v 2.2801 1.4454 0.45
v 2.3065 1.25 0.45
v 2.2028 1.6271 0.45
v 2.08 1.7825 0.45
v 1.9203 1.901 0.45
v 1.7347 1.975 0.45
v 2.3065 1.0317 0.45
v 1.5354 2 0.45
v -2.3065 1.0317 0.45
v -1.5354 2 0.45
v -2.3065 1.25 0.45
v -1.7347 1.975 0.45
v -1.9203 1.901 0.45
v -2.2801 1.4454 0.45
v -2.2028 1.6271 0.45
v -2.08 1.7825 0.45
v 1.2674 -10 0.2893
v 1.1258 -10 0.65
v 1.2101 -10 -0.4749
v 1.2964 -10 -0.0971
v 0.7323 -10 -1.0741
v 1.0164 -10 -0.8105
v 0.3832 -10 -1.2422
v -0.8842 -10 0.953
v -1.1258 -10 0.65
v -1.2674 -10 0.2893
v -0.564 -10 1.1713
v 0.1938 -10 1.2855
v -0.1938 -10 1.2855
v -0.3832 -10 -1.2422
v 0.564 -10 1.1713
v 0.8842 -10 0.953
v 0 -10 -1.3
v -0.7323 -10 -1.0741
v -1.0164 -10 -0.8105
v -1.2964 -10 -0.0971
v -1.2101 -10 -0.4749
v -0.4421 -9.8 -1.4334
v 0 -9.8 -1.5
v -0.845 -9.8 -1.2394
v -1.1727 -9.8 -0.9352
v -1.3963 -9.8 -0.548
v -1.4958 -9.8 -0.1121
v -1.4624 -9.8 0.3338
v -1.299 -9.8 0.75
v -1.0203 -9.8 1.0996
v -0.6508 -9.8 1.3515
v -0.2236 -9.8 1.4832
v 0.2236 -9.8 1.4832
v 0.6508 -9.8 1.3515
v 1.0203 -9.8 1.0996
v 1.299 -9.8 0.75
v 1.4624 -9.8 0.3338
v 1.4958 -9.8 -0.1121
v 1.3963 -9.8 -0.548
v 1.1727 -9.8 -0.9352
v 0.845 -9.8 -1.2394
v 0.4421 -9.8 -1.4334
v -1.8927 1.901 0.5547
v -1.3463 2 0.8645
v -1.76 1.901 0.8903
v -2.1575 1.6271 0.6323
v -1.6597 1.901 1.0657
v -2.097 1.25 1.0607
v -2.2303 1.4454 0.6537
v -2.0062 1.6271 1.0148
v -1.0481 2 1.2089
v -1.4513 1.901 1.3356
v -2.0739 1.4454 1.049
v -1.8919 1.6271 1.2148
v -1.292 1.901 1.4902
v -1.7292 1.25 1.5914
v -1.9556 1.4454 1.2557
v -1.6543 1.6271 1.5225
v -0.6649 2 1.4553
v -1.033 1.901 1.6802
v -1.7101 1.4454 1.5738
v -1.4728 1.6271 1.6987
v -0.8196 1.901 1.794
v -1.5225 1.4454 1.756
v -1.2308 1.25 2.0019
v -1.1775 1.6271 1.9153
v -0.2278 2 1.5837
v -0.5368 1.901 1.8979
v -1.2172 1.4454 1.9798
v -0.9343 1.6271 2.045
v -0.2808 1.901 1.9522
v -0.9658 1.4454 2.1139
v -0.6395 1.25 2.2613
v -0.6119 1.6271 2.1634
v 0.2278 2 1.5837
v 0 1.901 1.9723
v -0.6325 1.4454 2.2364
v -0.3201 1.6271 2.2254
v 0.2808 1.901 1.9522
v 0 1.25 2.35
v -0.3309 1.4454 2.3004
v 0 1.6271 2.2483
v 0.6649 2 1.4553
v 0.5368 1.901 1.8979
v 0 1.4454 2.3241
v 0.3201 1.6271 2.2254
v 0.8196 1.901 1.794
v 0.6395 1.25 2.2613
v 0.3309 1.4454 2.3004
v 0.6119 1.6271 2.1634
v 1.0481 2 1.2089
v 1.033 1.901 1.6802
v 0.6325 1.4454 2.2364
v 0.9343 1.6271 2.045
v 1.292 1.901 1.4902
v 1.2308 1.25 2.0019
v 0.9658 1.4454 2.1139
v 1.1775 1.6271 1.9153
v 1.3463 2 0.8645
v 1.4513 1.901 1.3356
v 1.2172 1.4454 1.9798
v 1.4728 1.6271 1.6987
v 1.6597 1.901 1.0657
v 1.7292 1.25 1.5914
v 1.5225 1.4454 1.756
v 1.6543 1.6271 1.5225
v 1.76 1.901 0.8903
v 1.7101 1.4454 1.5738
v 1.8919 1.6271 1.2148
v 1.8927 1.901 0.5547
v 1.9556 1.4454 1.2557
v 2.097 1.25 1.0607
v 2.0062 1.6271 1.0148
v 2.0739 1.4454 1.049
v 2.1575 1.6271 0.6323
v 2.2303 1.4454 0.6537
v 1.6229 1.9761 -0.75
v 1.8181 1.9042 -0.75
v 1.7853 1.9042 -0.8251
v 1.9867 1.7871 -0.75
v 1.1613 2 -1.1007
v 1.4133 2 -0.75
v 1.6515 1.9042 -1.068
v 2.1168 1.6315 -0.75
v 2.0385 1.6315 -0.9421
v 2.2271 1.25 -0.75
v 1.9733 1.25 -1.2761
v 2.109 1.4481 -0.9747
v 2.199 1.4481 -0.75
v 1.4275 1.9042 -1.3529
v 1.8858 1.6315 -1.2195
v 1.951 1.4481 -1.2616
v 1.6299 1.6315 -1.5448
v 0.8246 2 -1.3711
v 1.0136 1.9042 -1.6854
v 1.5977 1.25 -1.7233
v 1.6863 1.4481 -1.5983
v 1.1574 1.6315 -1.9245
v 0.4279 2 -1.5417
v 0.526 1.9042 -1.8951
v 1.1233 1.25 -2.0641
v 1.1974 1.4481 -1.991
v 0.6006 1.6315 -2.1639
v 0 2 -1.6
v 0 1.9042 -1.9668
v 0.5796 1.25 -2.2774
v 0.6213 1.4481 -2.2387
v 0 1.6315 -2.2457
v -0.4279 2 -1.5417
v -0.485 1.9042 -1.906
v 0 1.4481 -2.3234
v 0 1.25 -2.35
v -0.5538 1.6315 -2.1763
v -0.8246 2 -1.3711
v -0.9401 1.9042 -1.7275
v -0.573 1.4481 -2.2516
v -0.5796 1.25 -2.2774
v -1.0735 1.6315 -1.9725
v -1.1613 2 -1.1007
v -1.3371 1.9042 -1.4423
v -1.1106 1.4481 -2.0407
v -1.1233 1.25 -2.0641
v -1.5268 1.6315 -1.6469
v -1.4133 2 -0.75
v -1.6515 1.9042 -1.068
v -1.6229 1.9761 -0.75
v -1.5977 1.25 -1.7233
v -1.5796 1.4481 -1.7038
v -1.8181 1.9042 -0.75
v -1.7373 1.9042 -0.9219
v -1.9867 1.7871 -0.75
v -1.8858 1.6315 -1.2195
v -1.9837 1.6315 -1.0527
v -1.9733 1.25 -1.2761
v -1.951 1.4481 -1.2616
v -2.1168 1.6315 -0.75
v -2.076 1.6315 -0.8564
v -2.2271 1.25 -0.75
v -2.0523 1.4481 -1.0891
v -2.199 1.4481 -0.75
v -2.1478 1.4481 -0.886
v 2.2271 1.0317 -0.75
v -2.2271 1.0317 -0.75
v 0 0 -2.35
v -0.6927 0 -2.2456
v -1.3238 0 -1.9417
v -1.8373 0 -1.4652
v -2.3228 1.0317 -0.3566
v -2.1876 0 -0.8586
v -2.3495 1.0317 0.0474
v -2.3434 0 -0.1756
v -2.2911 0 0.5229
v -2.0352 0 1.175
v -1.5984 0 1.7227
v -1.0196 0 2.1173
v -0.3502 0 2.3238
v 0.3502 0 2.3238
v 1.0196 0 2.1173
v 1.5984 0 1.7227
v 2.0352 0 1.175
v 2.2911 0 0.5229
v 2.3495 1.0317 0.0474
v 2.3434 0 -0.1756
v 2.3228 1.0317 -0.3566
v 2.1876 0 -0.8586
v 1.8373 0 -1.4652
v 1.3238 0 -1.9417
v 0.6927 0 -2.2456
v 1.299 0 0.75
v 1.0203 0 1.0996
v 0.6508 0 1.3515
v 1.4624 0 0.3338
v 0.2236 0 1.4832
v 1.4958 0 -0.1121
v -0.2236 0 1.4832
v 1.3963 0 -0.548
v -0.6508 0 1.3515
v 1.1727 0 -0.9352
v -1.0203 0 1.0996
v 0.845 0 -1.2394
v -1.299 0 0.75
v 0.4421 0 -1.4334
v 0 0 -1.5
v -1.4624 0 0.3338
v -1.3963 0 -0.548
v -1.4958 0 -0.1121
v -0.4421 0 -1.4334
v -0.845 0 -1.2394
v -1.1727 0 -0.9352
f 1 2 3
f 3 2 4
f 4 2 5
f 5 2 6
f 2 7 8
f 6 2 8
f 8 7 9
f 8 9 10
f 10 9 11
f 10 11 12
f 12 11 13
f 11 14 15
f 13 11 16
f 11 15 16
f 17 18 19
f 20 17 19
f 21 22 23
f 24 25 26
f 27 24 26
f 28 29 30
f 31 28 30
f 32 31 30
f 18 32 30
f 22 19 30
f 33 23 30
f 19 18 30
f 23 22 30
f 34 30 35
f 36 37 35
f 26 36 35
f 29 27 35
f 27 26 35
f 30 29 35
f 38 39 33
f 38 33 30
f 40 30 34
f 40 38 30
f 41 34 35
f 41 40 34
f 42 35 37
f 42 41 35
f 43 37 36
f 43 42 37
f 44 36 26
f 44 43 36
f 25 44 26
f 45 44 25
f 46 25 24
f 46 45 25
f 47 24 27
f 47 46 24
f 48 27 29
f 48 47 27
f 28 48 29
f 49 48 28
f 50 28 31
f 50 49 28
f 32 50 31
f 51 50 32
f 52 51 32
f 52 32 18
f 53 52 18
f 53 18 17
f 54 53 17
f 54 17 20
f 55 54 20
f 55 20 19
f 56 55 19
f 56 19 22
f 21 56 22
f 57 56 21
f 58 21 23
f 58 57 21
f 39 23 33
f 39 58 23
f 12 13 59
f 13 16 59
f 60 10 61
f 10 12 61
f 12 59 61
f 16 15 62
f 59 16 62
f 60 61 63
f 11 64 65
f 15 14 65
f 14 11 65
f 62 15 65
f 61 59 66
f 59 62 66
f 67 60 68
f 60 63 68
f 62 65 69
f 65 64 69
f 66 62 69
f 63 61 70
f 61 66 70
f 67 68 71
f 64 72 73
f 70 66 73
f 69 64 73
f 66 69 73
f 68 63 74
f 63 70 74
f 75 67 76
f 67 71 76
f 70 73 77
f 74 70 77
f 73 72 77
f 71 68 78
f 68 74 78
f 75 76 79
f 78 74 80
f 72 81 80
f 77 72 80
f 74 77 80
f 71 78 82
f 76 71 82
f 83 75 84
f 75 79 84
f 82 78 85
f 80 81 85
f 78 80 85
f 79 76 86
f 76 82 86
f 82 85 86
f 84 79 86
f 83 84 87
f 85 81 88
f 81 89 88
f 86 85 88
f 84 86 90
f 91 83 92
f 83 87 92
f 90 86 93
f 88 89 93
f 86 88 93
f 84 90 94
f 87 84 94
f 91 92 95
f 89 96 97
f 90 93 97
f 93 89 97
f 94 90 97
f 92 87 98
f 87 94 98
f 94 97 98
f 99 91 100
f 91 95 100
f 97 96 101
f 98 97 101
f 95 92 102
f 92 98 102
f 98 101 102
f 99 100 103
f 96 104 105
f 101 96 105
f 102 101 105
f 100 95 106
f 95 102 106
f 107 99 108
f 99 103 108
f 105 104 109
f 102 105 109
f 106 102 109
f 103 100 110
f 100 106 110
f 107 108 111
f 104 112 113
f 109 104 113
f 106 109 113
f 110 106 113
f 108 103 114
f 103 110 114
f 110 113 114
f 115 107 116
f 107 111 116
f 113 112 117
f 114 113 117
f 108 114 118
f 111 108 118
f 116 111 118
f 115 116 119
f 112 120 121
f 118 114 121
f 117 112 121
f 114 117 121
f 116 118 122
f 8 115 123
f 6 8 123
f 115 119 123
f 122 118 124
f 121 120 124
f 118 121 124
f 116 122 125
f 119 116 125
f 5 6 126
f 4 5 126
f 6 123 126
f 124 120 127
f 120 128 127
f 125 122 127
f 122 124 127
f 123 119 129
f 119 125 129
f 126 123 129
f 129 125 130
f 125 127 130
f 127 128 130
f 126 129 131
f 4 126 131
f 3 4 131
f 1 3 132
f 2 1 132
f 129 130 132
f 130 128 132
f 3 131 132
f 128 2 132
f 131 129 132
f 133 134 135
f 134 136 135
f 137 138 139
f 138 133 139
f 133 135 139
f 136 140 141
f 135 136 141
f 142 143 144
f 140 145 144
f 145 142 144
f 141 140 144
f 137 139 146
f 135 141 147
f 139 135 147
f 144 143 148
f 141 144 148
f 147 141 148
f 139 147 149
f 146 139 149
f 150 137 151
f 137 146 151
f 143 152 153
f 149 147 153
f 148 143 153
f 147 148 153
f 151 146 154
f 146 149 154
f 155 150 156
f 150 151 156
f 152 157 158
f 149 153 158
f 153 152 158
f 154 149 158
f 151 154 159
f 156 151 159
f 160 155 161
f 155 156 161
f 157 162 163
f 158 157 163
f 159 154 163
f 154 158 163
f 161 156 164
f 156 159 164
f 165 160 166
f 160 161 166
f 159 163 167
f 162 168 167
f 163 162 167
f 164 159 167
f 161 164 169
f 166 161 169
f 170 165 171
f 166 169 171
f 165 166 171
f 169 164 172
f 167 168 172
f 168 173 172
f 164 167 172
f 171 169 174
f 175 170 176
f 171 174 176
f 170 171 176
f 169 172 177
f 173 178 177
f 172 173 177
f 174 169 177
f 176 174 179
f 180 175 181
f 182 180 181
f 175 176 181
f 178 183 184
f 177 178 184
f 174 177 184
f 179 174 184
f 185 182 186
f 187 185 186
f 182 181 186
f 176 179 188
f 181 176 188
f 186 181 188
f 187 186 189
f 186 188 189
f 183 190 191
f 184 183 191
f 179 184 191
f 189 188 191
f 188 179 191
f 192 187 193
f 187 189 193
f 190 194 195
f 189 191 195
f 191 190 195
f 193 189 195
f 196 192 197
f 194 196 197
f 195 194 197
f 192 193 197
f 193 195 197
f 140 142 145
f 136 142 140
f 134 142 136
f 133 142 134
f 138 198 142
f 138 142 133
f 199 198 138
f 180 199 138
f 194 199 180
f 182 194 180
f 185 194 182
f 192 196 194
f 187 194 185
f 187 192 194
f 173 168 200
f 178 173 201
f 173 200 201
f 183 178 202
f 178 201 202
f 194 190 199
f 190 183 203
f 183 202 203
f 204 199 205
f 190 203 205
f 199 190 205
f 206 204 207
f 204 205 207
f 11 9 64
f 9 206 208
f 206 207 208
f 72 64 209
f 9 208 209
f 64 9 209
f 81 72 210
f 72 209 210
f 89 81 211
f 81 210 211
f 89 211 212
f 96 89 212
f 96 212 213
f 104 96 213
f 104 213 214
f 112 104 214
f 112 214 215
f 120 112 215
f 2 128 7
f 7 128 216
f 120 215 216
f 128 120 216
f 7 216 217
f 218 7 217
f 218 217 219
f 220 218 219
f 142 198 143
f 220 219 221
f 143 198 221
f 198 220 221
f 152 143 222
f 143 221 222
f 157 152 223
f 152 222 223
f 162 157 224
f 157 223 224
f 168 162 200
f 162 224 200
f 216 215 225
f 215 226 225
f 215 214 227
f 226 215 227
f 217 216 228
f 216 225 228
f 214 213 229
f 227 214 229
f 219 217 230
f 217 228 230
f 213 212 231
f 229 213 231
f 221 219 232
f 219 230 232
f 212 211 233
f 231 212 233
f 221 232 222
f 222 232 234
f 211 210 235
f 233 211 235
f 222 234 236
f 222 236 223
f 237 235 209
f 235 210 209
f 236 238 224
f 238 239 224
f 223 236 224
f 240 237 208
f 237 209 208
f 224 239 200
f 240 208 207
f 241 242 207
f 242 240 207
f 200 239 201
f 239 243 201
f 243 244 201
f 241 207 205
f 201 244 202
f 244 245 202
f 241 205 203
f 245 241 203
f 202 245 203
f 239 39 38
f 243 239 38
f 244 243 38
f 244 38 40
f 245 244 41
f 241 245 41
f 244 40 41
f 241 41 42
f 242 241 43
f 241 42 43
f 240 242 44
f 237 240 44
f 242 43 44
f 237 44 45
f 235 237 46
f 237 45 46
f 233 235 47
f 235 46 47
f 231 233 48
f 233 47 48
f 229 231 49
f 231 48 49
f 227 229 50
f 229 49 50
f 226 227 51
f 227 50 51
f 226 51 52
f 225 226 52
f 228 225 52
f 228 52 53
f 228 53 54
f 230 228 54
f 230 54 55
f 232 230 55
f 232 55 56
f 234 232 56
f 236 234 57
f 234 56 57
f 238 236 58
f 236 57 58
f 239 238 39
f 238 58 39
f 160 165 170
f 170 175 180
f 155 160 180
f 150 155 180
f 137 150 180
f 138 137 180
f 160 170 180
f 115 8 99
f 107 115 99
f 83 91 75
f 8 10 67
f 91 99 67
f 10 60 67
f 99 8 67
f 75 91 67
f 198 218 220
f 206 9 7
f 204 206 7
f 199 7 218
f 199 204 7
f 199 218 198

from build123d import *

# Parameters (mm, degrees)
SKETCH2_W               = 1.2
SKETCH2_H               = 2.96832053
CUT_EXTRUDE1_DEPTH      = 3.35
CUT_EXTRUDE1_DEPTH_BACK = 3.35
CHAMFER_1_SIZE          = 0.2


with BuildPart() as part:
    # Sketch1 → Revolve1 (revolve)
    with BuildSketch(Plane(origin=(0, 0, 0), x_dir=(0, 0, -1), z_dir=(1, 0, 0))):
        with BuildLine():
            Line((1.5, -10), (0, -10))
            Line((0, -10), (0, 2))
            Line((0, 2), (1.6, 2))
            ThreePointArc((1.6, 2), (2.130330086, 1.780330086), (2.35, 1.25))
            Line((2.35, 1.25), (2.35, 0))
            Line((2.35, 0), (1.5, 0))
            Line((1.5, 0), (1.5, -10))
        make_face()
    revolve(axis=Axis((0, -26.35, 0), (0, 1, 0)))

    # Sketch2 → Cut-Extrude1 (cut, two sides)
    with BuildSketch(Plane(origin=(0, 0, 0), x_dir=(0, 0, -1), z_dir=(1, 0, 0))) as cut_extrude1_sk:
        with Locations((0.15, 2.515839735)):
            Rectangle(SKETCH2_W, SKETCH2_H)
    extrude(amount=CUT_EXTRUDE1_DEPTH, mode=Mode.SUBTRACT)
    extrude(cut_extrude1_sk.sketch, amount=-CUT_EXTRUDE1_DEPTH_BACK, mode=Mode.SUBTRACT)

    # Фаска1
    chamfer_1_edges = [part.edges().sort_by_distance(p)[0] for p in [
        (0, -10, 1.5),
    ]]
    chamfer(chamfer_1_edges, length=CHAMFER_1_SIZE)


solid = part.part
